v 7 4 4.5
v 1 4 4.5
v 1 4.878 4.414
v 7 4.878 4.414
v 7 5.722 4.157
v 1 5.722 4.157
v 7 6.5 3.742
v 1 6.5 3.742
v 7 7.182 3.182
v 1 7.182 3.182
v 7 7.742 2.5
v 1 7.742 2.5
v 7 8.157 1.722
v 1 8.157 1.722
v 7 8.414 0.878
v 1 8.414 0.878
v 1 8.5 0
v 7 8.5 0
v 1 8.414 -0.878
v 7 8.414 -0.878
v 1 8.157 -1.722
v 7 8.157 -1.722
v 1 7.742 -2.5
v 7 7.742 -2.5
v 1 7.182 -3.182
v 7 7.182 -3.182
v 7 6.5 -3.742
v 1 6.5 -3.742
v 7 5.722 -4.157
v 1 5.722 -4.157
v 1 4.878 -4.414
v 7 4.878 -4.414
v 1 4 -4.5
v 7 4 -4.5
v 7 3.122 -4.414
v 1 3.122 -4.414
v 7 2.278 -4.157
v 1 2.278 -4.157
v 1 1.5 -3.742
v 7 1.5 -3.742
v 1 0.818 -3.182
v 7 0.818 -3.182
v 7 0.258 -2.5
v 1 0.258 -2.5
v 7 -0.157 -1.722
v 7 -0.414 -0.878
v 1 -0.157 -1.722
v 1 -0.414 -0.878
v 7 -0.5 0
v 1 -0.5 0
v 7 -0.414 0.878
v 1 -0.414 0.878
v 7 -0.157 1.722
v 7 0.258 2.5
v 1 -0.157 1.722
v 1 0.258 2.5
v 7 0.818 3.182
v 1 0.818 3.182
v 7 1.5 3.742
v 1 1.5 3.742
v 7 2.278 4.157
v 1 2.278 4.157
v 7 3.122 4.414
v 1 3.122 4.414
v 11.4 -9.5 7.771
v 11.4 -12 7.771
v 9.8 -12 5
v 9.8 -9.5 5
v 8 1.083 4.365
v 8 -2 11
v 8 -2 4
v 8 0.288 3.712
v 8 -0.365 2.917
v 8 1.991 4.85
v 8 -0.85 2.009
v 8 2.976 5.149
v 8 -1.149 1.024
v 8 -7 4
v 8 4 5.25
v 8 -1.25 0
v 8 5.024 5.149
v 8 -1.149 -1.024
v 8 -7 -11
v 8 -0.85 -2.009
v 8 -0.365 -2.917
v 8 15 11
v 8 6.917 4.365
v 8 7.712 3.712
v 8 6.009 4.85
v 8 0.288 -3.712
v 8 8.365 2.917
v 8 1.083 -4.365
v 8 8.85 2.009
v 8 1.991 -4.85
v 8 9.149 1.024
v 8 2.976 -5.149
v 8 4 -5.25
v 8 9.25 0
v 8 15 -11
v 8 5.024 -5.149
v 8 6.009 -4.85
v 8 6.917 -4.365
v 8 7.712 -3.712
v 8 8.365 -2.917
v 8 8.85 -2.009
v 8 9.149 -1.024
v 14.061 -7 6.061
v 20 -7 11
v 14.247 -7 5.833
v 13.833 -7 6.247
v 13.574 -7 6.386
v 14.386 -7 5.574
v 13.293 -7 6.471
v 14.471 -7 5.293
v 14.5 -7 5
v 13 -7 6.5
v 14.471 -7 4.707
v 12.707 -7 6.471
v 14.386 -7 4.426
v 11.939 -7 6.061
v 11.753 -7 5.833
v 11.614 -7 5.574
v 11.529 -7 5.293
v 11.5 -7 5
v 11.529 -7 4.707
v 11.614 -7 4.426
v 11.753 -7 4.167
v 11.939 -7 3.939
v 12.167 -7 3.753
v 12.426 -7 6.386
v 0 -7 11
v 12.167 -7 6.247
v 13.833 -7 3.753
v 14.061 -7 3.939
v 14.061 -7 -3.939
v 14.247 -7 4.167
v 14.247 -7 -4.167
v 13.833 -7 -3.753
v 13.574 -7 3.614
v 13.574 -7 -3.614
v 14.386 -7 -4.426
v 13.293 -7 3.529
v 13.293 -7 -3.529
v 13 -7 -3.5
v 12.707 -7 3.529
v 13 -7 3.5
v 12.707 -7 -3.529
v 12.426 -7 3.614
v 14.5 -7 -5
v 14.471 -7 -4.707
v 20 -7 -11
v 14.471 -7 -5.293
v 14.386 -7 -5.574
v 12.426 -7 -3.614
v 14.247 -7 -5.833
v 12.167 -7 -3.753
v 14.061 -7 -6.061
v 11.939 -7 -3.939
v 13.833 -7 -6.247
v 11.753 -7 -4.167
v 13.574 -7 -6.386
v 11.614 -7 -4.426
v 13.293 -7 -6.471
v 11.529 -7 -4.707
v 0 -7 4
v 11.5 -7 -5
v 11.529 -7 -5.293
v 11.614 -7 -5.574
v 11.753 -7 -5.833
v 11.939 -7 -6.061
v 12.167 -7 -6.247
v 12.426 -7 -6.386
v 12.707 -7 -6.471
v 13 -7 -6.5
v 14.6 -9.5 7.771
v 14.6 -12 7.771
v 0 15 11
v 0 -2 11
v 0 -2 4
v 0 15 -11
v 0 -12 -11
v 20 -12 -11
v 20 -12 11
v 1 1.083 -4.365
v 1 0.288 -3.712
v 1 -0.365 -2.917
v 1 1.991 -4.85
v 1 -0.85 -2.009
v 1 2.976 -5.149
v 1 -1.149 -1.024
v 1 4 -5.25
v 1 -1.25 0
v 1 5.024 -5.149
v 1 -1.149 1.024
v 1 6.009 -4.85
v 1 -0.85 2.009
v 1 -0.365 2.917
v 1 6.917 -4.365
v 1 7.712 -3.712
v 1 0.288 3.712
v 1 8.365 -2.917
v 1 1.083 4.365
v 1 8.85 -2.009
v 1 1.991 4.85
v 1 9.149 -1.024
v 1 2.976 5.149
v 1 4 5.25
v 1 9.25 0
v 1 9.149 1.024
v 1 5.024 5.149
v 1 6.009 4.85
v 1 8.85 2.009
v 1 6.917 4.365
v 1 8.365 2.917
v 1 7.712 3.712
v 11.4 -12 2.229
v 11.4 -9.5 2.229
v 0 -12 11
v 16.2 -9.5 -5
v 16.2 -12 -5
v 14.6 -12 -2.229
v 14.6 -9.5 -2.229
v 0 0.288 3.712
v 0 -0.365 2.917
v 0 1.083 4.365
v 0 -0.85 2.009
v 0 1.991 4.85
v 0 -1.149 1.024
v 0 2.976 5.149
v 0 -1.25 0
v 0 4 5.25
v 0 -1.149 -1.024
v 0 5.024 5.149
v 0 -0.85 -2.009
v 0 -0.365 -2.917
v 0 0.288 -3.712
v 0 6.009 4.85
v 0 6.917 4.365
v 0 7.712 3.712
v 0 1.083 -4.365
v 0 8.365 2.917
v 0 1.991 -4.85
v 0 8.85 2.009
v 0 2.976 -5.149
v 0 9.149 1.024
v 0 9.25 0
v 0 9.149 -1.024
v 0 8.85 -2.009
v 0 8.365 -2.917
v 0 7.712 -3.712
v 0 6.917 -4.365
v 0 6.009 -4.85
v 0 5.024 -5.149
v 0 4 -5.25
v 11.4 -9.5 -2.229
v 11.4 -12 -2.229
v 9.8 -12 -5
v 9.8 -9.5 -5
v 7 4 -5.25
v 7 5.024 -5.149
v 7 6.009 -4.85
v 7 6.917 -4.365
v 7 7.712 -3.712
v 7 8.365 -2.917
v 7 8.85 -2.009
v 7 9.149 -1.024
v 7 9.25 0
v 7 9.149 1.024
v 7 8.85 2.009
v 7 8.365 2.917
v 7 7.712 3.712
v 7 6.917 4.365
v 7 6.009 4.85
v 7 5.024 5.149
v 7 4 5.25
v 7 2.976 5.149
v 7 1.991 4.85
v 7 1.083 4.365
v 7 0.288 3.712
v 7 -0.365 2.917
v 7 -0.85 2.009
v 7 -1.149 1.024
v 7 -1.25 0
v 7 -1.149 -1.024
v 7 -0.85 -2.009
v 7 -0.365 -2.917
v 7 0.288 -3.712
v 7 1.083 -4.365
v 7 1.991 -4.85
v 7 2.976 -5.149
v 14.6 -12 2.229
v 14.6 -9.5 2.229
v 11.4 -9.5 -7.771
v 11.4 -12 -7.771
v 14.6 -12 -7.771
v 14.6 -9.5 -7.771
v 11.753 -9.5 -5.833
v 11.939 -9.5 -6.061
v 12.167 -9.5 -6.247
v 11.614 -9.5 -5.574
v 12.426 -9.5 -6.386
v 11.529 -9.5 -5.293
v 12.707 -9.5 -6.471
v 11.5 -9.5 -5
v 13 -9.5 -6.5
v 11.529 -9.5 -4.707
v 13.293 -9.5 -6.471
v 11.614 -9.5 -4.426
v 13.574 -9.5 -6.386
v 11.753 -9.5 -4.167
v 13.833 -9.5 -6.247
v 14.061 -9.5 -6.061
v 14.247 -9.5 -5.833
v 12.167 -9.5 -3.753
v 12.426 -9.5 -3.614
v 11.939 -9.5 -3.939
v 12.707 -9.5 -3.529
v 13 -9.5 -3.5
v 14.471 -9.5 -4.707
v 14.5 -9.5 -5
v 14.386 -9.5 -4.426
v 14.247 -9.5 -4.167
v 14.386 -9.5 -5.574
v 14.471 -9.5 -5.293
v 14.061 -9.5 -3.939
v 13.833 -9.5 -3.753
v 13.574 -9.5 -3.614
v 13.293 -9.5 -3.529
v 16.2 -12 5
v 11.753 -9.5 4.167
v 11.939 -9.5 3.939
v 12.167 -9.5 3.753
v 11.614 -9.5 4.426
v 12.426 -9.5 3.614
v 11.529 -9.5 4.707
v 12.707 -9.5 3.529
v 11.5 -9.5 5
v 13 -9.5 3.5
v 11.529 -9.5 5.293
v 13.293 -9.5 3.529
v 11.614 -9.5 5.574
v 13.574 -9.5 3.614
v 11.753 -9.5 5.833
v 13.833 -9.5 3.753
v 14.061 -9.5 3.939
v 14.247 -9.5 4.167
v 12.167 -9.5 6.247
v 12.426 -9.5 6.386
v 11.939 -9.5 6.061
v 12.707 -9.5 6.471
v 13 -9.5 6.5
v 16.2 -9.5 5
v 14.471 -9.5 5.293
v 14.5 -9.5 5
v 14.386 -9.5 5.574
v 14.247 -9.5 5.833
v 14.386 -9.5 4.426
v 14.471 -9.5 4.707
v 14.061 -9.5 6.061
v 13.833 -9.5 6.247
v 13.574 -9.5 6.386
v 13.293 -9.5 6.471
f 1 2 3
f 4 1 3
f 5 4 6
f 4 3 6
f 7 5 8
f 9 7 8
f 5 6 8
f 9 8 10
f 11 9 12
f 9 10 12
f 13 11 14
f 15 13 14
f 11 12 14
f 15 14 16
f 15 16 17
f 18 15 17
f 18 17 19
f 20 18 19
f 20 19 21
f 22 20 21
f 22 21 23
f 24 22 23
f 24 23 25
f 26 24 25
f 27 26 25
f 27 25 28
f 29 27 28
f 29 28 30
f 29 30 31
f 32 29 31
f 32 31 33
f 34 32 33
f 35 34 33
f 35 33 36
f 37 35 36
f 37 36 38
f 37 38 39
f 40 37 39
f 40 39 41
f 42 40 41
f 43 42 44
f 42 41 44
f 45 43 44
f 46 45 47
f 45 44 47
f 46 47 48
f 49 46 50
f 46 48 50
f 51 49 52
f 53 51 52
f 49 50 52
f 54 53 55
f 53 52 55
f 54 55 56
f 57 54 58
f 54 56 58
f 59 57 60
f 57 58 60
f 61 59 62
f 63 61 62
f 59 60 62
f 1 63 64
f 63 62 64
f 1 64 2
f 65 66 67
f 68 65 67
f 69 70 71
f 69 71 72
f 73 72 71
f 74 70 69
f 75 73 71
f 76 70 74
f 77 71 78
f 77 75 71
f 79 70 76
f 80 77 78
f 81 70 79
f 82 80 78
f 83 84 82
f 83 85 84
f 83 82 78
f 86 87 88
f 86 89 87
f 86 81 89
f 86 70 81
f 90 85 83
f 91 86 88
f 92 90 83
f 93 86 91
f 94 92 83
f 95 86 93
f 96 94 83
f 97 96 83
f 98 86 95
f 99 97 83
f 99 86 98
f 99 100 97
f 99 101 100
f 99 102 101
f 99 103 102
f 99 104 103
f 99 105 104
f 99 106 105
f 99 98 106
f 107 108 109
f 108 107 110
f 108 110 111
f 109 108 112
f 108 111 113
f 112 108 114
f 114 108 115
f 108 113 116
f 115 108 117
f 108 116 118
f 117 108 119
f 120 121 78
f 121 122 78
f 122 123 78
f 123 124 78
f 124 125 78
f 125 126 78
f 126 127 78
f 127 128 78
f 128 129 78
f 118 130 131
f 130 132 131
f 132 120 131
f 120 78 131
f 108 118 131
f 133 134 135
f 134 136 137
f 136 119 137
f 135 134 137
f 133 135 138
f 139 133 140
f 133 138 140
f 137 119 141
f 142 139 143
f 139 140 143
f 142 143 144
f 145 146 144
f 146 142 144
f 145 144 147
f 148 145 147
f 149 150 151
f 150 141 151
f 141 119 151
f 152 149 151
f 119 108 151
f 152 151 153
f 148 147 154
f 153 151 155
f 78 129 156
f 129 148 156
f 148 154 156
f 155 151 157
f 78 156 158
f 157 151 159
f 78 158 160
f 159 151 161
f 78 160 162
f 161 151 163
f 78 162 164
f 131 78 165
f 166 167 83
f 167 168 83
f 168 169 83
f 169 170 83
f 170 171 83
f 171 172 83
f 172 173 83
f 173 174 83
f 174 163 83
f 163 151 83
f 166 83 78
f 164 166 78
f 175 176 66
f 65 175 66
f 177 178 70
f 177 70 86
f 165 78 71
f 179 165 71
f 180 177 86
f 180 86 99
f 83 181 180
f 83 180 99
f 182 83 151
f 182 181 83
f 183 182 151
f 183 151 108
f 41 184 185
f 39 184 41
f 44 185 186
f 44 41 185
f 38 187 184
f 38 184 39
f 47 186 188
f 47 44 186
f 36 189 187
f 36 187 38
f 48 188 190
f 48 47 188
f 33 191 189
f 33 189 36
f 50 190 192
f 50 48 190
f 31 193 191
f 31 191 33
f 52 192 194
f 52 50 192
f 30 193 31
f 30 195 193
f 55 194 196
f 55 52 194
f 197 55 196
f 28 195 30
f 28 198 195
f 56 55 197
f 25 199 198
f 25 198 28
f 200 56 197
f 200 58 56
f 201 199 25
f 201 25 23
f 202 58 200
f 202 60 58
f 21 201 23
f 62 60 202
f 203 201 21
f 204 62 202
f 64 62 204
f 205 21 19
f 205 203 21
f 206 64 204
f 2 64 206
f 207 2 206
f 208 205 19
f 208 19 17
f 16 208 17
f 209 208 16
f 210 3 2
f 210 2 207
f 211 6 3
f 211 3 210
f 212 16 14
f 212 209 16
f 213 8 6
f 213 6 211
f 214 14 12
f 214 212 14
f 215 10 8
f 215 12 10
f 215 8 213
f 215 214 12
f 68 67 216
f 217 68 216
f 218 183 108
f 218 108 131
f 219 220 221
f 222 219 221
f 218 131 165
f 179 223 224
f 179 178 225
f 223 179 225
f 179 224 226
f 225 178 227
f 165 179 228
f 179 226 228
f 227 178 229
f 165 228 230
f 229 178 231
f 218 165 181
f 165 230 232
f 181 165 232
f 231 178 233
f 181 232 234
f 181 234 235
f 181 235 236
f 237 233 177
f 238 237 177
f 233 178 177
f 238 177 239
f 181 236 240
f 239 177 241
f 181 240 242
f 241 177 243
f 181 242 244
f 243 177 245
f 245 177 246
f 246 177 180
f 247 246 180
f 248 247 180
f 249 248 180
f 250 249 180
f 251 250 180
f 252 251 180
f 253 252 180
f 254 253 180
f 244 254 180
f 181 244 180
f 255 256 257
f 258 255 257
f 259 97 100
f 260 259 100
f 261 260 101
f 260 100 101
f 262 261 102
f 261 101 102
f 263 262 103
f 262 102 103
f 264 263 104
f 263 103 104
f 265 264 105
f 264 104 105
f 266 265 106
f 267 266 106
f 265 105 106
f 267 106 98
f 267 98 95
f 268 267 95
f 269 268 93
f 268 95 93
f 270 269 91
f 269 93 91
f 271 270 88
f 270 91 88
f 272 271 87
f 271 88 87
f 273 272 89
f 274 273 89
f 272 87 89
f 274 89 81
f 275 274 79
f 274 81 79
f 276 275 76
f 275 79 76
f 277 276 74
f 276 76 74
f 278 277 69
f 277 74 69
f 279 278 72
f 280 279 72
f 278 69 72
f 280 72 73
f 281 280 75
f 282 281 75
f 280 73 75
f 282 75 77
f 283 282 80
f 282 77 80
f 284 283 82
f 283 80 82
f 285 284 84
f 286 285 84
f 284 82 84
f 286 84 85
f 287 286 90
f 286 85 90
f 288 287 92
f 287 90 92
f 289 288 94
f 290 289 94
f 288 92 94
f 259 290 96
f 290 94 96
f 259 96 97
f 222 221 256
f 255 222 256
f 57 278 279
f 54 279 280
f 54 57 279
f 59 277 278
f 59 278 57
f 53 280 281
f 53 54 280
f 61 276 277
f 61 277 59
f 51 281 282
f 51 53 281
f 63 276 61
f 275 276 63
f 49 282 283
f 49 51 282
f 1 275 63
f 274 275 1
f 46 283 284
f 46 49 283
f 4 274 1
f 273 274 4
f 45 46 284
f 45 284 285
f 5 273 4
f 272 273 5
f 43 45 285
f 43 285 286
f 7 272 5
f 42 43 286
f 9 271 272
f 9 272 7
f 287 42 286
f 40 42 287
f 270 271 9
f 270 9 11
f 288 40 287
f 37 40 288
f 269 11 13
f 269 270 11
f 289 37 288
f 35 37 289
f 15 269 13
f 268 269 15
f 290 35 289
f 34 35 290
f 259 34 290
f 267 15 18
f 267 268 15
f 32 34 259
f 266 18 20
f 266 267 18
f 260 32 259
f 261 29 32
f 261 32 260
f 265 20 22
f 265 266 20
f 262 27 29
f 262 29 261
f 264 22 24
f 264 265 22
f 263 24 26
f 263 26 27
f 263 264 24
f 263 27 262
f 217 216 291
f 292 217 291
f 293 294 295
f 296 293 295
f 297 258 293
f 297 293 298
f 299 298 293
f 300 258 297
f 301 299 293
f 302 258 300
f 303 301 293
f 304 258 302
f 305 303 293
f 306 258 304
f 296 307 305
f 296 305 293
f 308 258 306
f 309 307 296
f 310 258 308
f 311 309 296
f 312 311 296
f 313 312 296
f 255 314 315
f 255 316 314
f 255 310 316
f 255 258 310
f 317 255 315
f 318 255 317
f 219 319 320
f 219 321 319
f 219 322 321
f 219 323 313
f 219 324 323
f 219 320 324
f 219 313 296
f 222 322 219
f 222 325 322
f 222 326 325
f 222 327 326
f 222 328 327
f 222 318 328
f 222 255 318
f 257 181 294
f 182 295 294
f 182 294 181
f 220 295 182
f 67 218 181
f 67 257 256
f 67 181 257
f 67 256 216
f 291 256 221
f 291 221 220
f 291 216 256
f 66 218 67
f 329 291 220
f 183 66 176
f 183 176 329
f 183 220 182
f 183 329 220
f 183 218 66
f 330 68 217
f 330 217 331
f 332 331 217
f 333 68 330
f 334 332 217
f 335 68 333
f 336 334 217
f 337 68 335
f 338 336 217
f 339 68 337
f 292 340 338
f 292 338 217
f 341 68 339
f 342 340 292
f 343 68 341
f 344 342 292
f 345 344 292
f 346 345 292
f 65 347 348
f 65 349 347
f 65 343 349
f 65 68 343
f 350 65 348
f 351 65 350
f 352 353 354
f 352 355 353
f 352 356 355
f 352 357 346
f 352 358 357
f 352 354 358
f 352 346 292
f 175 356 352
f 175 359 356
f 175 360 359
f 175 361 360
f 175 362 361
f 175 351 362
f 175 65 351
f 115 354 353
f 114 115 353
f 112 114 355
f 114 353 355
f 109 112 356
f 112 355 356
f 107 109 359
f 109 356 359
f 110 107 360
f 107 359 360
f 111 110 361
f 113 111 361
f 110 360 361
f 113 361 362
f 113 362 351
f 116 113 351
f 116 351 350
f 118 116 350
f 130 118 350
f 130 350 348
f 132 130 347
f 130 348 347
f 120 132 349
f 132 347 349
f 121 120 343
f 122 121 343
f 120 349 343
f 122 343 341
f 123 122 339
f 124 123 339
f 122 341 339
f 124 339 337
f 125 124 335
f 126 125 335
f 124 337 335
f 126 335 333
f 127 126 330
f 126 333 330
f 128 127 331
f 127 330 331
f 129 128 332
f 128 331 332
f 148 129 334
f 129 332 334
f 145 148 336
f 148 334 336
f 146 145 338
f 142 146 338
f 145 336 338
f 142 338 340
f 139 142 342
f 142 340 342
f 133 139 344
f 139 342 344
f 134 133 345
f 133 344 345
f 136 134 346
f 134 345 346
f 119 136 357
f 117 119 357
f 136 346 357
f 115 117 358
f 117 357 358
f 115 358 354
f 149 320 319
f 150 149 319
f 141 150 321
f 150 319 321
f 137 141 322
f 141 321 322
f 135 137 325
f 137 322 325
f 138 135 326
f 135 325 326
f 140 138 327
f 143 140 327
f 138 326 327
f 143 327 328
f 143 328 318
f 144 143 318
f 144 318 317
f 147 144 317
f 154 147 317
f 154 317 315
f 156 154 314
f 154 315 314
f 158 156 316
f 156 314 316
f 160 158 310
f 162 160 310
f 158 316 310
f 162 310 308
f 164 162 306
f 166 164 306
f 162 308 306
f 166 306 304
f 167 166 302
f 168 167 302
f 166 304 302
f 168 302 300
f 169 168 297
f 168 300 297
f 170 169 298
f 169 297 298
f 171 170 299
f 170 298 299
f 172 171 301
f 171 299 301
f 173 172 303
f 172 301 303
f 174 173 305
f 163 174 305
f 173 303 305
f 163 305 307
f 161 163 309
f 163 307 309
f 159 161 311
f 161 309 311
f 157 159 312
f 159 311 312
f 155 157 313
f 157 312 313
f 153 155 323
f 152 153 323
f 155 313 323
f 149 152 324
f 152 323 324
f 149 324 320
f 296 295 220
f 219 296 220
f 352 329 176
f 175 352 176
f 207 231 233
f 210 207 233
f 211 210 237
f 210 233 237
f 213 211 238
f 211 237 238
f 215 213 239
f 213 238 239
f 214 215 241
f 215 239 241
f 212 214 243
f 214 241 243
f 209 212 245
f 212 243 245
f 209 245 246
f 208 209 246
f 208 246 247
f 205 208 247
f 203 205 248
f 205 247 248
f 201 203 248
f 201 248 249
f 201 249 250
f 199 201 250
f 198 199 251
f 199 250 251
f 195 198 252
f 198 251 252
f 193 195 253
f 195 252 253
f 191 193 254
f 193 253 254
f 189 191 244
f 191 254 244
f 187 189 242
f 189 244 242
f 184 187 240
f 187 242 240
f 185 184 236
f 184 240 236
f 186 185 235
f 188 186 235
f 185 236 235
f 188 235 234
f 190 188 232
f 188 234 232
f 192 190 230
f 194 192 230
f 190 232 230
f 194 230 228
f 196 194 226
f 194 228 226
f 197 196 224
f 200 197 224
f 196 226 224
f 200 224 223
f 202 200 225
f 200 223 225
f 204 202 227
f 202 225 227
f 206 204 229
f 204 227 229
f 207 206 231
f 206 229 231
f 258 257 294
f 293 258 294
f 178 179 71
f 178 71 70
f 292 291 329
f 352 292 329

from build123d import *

# Parameters (mm, degrees)
SKETCH_1_W             = 22
SKETCH_1_H             = 30
EXTRUDE_1_DEPTH        = 8
SKETCH_2_R             = 4.5
CUT_EXTRUDE_1_DEPTH    = 9
SKETCH_3_W             = 7
SKETCH_3_H             = 8
CUT_EXTRUDE_2_DEPTH    = 9
SKETCH_4_R             = 5.25
CUT_EXTRUDE_3_DEPTH    = 1
SKETCH_5_R             = 5.25
CUT_EXTRUDE_4_DEPTH    = 1
SKETCH_6_W             = 22
SKETCH_6_H             = 5
EXTRUDE_2_DEPTH        = 12
CUT_EXTRUDE_5_DEPTH    = 2.5
PATTERN_LINEAR_1_COUNT = 2
PATTERN_LINEAR_1_PITCH = 10
SKETCH_8_R             = 1.5
CUT_EXTRUDE_6_DEPTH    = 28.5
PATTERN_LINEAR_2_COUNT = 2
PATTERN_LINEAR_2_PITCH = 10
EXTRUDE_3_DEPTH        = 3
SKETCH_12_R            = 1.5
CUT_EXTRUDE_7_DEPTH    = 26
SKETCH_14_R            = 1.5
CUT_EXTRUDE_8_DEPTH    = 26
CUT_EXTRUDE_9_DEPTH    = 3
PATTERN_LINEAR_3_COUNT = 2
PATTERN_LINEAR_3_PITCH = 10
SKETCH_16_W            = 20
SKETCH_16_H            = 22
CUT_EXTRUDE_10_DEPTH   = 3


with BuildPart() as part:
    # 草图1 → 凸台-拉伸1 (new body)
    with BuildSketch(Plane(origin=(0, 0, 0), x_dir=(0, 0, -1), z_dir=(1, 0, 0))):
        Rectangle(SKETCH_1_W, SKETCH_1_H)
    extrude(amount=EXTRUDE_1_DEPTH)

    # 草图2 → 切除-拉伸1 (cut, through all)
    with BuildSketch(Plane.ZY):
        with Locations((0, 4)):
            Circle(SKETCH_2_R)
    extrude(amount=-CUT_EXTRUDE_1_DEPTH, mode=Mode.SUBTRACT)

    # 草图3 → 切除-拉伸2 (cut, through all)
    with BuildSketch(Plane.ZY):
        with Locations((7.5, -6)):
            Rectangle(SKETCH_3_W, SKETCH_3_H)
    extrude(amount=-CUT_EXTRUDE_2_DEPTH, mode=Mode.SUBTRACT)

    # 草图4 → 切除-拉伸3 (cut)
    with BuildSketch(Plane.ZY):
        with Locations((0, 4)):
            Circle(SKETCH_4_R)
    extrude(amount=-CUT_EXTRUDE_3_DEPTH, mode=Mode.SUBTRACT)

    # 草图5 → 切除-拉伸4 (cut)
    with BuildSketch(Plane(origin=(8, 0, 0), x_dir=(0, 0, -1), z_dir=(1, 0, 0))):
        with Locations((0, 4)):
            Circle(SKETCH_5_R)
    extrude(amount=-CUT_EXTRUDE_4_DEPTH, mode=Mode.SUBTRACT)

    # 草图6 → 凸台-拉伸2 (add)
    with BuildSketch(Plane(origin=(8, 0, 0), x_dir=(0, 0, -1), z_dir=(1, 0, 0))):
        with Locations((0, -12.5)):
            Rectangle(SKETCH_6_W, SKETCH_6_H)
    extrude(amount=EXTRUDE_2_DEPTH)

    # 草图7 → 切除-拉伸5 (cut)
    with BuildSketch(Plane.XZ.offset(15)):
        Polygon((9.8, -5), (11.4, -7.771281292), (14.6, -7.771281292), (16.2, -5), (14.6, -2.228718708), (11.4, -2.228718708), align=None)
    cut_extrude_5 = extrude(amount=-CUT_EXTRUDE_5_DEPTH, mode=Mode.SUBTRACT)

    # 阵列(线性)1: 切除-拉伸5 ×2
    with Locations(*[(0, 0, i * PATTERN_LINEAR_1_PITCH) for i in range(1, PATTERN_LINEAR_1_COUNT)]):
        add(cut_extrude_5, mode=Mode.SUBTRACT)

    # 草图8 → 切除-拉伸6 (cut, through all)
    with BuildSketch(Plane.XZ.offset(12.5)):
        with Locations((13, 5)):
            Circle(SKETCH_8_R)
    cut_extrude_6 = extrude(amount=-CUT_EXTRUDE_6_DEPTH, mode=Mode.SUBTRACT)

    # 阵列(线性)2: 切除-拉伸6 ×2
    with Locations(*[(0, 0, -i * PATTERN_LINEAR_2_PITCH) for i in range(1, PATTERN_LINEAR_2_COUNT)]):
        add(cut_extrude_6, mode=Mode.SUBTRACT)

    # 草图10 → 凸台-拉伸3 (add)
    with BuildSketch(Plane(origin=(0, -10, 0), x_dir=(1, 0, 0), z_dir=(0, 1, 0))):
        Polygon((0, -4), (8, -4), (8, 11), (20, 11), (20, -11), (0, -11), align=None)
    extrude(amount=EXTRUDE_3_DEPTH)

    # 草图12 → 切除-拉伸7 (cut, through all)
    with BuildSketch(Plane.XZ.offset(10)):
        with Locations((13, 5)):
            Circle(SKETCH_12_R)
    extrude(amount=-CUT_EXTRUDE_7_DEPTH, mode=Mode.SUBTRACT)

    # 草图14 → 切除-拉伸8 (cut, through all)
    with BuildSketch(Plane.XZ.offset(10)):
        with Locations((13, -5)):
            Circle(SKETCH_14_R)
    extrude(amount=-CUT_EXTRUDE_8_DEPTH, mode=Mode.SUBTRACT)

    # 草图15 → 切除-拉伸9 (cut)
    with BuildSketch(Plane.XZ.offset(12.5)):
        Polygon((16.2, 5), (14.6, 7.771281292), (11.4, 7.771281292), (9.8, 5), (11.4, 2.228718708), (14.6, 2.228718708), align=None)
    cut_extrude_9 = extrude(amount=-CUT_EXTRUDE_9_DEPTH, mode=Mode.SUBTRACT)

    # 阵列(线性)3: 切除-拉伸9 ×2
    with Locations(*[(0, 0, -i * PATTERN_LINEAR_3_PITCH) for i in range(1, PATTERN_LINEAR_3_COUNT)]):
        add(cut_extrude_9, mode=Mode.SUBTRACT)

    # 草图16 → 切除-拉伸10 (cut)
    with BuildSketch(Plane.XZ.offset(15)):
        with Locations((10, 0)):
            Rectangle(SKETCH_16_W, SKETCH_16_H)
    extrude(amount=-CUT_EXTRUDE_10_DEPTH, mode=Mode.SUBTRACT)


solid = part.part
